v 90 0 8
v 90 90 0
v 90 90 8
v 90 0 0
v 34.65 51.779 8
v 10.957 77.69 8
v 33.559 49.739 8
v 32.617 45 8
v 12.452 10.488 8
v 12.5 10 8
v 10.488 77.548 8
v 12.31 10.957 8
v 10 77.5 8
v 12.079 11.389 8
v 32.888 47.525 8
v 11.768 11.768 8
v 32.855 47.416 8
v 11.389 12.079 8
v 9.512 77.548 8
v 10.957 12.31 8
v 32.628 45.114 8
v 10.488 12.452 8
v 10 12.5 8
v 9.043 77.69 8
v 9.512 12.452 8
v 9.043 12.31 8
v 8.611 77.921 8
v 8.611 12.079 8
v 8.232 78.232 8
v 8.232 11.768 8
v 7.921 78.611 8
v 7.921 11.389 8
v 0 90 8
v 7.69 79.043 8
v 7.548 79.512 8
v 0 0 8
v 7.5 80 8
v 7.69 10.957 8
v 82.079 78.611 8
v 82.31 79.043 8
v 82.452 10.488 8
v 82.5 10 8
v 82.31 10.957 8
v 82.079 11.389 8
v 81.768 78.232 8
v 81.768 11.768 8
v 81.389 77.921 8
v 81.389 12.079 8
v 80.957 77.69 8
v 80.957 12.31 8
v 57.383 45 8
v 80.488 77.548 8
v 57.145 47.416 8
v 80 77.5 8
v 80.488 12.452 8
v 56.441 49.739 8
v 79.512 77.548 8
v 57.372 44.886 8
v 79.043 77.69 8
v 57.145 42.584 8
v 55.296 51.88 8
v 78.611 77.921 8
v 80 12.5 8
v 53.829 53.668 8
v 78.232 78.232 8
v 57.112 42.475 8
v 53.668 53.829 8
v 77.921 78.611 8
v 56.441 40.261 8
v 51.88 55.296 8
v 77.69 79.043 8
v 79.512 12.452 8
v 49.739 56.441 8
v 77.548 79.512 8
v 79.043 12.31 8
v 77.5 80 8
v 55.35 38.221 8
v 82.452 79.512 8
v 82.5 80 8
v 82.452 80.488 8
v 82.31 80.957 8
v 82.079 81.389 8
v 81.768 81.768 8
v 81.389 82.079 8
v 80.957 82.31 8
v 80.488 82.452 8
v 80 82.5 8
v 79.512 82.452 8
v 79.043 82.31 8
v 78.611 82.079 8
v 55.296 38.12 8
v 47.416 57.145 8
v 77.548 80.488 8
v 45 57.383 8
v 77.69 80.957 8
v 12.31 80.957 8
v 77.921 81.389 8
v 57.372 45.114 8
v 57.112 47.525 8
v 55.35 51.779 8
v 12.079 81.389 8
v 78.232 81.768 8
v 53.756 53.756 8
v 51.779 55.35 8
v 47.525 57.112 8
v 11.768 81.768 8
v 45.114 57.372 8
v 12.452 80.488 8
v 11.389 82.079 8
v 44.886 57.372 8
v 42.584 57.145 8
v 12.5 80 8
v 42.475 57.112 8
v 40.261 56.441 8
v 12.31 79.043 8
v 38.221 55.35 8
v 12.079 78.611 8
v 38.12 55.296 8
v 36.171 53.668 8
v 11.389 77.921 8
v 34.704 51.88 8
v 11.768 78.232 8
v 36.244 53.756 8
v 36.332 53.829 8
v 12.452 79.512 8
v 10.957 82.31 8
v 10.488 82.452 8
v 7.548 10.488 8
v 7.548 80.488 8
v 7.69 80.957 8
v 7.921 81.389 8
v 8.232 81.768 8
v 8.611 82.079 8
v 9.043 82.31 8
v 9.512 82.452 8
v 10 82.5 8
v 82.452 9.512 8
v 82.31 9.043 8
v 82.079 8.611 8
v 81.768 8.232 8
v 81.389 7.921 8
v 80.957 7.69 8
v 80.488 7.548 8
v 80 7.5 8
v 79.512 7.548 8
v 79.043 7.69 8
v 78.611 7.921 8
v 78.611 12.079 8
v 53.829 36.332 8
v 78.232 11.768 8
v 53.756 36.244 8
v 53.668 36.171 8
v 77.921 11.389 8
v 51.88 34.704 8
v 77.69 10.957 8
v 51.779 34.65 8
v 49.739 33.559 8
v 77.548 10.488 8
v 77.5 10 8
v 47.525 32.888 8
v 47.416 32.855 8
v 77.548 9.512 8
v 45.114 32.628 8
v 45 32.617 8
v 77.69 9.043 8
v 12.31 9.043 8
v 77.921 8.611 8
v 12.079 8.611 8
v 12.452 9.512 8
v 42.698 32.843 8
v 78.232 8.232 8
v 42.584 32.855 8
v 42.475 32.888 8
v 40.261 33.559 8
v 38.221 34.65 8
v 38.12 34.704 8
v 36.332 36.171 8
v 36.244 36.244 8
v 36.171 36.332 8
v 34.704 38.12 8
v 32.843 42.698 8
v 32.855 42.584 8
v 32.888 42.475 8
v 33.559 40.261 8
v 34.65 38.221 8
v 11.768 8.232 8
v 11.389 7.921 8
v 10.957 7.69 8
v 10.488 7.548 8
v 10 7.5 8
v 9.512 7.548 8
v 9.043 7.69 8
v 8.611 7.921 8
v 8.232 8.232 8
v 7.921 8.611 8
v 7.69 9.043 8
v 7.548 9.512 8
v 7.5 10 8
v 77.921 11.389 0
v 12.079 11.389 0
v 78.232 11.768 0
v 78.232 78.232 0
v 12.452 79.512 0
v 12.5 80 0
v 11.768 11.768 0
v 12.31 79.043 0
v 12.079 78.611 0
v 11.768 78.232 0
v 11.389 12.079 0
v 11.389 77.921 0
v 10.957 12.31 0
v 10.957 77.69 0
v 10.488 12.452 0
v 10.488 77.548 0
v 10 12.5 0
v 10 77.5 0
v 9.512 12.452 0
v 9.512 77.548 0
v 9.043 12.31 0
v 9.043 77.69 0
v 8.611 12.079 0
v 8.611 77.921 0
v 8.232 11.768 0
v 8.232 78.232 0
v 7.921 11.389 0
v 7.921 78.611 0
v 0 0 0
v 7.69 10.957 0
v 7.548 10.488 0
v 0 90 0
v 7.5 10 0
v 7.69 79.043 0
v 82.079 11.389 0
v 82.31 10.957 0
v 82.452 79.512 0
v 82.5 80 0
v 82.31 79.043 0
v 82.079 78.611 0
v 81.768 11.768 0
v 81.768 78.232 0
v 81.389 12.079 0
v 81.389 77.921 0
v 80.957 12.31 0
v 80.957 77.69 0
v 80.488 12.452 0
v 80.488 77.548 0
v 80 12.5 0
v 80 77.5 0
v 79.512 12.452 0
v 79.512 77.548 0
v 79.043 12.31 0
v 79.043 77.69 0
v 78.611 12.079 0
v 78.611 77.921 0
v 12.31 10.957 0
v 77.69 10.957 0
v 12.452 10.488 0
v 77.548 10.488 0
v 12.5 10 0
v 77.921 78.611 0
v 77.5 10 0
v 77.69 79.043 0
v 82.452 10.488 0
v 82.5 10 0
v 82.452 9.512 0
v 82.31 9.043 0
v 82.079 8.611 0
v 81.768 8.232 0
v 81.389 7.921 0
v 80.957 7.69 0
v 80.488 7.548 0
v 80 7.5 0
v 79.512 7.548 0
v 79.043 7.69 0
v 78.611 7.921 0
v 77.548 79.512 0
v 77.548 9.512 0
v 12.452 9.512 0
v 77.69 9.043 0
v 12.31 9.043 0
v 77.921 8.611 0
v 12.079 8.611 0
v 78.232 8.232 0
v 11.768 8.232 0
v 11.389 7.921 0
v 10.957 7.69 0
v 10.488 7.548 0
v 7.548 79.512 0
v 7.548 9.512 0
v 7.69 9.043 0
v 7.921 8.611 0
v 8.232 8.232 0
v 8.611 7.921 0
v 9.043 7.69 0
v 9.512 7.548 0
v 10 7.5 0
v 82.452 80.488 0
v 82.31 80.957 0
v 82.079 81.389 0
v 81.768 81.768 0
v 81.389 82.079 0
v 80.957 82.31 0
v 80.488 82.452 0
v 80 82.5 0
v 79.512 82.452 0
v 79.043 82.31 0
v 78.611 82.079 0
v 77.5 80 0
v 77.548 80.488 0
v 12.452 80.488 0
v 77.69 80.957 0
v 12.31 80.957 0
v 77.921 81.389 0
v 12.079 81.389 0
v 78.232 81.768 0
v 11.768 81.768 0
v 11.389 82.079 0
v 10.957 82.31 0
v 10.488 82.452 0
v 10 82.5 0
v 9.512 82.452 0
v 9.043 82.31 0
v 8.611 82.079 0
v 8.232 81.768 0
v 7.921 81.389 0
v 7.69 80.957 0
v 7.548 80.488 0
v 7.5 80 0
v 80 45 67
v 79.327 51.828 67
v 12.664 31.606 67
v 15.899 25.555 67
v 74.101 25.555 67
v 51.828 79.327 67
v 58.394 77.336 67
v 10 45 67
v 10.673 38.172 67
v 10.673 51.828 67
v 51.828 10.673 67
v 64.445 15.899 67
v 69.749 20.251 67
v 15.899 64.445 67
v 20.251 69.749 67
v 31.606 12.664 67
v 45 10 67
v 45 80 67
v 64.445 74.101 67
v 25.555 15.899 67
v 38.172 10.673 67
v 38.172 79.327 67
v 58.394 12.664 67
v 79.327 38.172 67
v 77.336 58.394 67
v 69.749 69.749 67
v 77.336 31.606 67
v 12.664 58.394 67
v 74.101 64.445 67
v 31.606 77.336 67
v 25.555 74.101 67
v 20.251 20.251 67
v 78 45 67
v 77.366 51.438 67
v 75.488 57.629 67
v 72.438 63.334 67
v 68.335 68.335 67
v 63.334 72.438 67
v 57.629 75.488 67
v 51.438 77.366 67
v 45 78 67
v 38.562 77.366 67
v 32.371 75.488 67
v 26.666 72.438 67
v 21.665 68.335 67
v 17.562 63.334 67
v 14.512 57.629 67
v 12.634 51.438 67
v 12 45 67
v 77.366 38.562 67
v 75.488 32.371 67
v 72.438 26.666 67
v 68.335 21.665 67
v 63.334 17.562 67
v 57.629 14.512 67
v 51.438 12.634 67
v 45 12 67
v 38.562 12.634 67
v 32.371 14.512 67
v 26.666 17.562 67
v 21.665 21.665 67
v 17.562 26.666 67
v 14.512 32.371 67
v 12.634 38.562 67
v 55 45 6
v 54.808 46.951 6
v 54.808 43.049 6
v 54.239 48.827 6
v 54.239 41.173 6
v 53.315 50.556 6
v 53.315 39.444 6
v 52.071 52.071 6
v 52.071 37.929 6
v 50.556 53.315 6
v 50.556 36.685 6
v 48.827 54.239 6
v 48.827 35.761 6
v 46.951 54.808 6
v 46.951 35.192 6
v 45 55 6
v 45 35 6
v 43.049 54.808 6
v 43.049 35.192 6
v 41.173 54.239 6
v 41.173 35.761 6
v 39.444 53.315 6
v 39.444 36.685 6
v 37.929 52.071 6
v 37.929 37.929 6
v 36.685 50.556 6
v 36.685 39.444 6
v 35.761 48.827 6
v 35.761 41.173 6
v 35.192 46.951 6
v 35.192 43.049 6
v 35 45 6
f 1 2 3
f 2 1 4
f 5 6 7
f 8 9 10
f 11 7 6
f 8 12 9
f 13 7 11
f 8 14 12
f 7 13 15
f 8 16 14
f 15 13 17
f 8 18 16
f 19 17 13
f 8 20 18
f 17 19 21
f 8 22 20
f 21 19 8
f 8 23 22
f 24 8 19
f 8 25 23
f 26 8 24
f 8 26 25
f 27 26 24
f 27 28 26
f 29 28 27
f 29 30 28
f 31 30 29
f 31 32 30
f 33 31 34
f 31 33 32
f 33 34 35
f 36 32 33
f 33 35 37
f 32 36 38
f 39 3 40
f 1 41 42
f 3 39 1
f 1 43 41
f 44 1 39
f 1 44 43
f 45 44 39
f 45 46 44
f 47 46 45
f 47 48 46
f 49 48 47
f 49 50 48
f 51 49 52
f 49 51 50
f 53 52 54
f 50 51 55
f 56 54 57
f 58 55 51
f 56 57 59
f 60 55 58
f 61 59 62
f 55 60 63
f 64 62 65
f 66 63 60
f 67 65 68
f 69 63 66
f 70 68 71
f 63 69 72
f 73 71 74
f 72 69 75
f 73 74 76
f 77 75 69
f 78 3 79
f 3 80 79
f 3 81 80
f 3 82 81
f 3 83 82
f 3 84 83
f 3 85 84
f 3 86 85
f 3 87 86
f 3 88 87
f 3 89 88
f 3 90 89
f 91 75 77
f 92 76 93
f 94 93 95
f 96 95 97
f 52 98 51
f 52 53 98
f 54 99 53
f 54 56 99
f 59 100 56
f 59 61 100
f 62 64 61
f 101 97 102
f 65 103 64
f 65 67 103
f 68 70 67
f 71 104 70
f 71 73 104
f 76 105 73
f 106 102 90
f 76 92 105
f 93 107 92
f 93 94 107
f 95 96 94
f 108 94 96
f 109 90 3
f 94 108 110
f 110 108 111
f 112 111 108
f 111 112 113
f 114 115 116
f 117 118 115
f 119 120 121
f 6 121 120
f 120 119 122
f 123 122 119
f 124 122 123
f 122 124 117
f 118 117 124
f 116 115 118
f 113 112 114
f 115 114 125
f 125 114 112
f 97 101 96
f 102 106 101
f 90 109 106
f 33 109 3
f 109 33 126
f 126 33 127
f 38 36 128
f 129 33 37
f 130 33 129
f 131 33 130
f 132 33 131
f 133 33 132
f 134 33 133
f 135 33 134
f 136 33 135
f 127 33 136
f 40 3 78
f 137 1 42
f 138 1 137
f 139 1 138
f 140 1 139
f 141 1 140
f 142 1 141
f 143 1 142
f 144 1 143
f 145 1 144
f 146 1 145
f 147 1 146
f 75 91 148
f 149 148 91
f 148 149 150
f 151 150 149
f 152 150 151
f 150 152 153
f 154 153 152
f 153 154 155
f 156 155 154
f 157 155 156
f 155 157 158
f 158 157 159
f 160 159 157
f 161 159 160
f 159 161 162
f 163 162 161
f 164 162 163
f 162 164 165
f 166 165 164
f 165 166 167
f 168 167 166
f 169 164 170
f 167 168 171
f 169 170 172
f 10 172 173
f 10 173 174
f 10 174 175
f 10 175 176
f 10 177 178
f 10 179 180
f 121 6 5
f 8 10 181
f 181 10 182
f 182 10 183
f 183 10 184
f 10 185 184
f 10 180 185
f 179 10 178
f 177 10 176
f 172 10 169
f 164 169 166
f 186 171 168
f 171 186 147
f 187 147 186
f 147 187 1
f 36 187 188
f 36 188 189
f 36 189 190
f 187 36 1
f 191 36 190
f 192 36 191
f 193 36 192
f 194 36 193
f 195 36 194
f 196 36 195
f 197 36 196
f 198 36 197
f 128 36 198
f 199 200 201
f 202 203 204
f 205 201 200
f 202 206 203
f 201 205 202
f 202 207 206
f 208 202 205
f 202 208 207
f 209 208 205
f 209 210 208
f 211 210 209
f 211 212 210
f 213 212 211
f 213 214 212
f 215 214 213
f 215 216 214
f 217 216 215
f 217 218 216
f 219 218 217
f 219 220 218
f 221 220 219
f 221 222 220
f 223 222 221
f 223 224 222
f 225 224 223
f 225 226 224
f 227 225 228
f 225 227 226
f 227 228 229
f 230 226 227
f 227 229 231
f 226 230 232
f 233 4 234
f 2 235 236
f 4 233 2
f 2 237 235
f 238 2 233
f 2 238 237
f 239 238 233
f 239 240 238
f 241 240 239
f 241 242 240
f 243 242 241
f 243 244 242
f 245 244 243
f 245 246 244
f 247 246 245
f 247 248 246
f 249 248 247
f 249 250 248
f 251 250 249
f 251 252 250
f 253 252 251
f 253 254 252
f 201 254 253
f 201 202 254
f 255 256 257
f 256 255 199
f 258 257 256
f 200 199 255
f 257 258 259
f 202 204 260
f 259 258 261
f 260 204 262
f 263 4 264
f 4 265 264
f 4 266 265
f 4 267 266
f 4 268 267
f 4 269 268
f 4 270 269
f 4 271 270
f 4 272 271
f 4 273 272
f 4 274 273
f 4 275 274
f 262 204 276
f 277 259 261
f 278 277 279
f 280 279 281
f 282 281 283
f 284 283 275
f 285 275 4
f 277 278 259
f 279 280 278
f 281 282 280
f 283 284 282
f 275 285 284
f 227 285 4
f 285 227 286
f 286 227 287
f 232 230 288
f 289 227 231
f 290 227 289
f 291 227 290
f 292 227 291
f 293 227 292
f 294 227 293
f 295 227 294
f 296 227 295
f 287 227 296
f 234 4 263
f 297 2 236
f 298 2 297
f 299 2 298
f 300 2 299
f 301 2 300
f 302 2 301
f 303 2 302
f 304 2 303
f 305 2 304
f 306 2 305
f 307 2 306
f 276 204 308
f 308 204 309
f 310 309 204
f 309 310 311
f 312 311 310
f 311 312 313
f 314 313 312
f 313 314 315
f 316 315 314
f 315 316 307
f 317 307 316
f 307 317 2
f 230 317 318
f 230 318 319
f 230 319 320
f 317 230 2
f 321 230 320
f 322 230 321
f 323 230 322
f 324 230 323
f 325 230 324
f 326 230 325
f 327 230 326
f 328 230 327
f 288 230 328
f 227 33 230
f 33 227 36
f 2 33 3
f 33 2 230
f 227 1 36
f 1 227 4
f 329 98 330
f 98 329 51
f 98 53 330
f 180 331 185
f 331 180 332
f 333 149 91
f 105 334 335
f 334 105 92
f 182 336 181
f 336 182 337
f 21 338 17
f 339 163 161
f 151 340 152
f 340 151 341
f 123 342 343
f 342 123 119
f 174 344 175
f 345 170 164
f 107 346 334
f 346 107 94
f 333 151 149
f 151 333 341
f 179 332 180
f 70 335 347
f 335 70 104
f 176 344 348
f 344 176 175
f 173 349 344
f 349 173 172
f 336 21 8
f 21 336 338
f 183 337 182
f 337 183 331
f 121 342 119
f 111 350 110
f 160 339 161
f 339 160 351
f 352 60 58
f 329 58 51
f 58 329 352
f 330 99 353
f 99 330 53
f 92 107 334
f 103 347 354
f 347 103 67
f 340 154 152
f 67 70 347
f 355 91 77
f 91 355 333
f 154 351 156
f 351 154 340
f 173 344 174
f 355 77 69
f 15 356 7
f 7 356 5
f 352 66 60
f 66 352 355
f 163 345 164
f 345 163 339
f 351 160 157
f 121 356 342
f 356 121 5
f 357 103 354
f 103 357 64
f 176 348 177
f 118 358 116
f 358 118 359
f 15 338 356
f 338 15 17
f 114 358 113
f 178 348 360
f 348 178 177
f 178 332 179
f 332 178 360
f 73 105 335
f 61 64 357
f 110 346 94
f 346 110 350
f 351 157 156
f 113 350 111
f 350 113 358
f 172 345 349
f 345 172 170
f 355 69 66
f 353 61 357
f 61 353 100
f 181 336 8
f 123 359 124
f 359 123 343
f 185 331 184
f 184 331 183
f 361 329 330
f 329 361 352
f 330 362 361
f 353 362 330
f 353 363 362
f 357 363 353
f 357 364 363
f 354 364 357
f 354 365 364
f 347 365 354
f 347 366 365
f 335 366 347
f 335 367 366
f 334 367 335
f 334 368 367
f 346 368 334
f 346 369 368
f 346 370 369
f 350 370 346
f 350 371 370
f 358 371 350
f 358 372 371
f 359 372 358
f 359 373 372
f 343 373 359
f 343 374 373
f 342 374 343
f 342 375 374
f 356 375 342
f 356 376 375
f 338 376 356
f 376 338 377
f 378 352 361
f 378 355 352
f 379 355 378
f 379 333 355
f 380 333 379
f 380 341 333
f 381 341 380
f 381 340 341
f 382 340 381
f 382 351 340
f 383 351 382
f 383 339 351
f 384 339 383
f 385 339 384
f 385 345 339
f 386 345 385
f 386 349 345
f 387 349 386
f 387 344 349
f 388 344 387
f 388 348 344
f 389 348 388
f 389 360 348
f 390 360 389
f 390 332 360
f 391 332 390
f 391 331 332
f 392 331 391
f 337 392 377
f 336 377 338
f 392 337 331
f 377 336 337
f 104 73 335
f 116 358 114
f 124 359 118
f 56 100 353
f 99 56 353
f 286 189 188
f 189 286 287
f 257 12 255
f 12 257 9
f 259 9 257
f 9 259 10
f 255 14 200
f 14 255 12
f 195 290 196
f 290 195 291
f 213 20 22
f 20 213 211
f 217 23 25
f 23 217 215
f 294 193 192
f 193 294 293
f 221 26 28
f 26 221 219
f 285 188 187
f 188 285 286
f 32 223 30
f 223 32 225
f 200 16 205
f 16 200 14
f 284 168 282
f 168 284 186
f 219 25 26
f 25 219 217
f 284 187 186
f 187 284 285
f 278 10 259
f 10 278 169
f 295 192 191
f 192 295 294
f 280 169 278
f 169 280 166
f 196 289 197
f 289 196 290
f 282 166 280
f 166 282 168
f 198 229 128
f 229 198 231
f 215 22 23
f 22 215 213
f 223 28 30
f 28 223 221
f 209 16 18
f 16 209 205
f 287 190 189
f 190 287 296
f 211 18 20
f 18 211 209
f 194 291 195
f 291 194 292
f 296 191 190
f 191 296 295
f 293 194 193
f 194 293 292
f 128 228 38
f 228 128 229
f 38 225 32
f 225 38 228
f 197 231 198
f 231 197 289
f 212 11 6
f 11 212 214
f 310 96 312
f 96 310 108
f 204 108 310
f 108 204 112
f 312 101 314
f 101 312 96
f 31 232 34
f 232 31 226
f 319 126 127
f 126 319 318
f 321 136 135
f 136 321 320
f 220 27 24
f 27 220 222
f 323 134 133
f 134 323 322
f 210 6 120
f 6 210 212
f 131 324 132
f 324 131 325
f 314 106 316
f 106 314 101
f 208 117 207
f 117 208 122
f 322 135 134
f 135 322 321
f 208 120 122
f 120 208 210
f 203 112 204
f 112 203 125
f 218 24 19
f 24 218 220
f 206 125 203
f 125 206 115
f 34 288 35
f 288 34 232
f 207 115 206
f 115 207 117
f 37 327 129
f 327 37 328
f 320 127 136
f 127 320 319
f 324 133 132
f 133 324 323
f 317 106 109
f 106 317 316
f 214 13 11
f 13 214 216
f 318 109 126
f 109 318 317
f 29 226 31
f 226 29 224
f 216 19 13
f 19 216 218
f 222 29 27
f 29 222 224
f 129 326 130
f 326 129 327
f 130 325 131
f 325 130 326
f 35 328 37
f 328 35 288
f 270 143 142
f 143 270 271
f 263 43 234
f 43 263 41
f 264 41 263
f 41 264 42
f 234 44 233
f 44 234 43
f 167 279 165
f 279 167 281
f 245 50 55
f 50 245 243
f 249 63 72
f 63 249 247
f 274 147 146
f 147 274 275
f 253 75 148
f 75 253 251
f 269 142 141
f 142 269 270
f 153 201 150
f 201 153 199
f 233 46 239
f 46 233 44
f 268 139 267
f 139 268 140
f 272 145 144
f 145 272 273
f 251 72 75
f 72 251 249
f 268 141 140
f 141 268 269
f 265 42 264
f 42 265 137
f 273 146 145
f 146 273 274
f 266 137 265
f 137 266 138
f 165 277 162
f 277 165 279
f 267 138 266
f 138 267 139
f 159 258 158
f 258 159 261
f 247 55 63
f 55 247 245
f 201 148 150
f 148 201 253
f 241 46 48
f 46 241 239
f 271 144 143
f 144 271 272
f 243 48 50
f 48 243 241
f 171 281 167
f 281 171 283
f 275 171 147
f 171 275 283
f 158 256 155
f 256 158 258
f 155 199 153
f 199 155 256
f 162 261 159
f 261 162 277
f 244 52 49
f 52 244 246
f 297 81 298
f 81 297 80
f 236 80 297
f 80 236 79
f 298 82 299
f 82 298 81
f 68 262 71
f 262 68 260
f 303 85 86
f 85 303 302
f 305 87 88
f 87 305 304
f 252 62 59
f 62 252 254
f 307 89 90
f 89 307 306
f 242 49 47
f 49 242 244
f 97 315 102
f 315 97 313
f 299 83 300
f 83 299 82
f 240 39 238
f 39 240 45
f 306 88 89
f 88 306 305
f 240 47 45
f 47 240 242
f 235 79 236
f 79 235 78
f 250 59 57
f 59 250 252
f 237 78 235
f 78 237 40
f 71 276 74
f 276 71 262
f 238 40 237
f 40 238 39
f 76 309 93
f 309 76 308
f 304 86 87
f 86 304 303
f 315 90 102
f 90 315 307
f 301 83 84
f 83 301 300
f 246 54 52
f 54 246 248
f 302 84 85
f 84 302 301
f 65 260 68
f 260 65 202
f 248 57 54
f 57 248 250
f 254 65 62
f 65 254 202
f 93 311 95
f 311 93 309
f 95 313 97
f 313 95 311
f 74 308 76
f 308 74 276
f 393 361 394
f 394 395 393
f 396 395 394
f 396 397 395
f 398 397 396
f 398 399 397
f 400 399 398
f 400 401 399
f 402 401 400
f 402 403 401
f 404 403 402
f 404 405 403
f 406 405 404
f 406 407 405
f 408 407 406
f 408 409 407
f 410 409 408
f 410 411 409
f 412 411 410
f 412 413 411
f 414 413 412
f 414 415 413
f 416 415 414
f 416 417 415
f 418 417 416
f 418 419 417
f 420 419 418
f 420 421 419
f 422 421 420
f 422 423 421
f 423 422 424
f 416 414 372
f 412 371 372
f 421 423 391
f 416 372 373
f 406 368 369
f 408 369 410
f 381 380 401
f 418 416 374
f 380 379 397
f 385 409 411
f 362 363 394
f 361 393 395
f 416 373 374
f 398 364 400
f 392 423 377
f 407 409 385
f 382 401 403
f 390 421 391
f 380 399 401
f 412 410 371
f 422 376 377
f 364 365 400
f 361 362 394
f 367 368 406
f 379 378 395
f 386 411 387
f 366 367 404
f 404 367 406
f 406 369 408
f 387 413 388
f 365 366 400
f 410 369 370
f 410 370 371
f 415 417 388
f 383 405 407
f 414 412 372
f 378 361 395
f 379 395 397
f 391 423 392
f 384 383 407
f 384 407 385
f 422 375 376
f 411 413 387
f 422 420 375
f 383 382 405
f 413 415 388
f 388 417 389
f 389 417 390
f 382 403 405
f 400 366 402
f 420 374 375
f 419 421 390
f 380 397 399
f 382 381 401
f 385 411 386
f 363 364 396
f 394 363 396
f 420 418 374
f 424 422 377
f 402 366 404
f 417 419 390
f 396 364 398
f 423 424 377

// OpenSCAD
$fn = 32;

// ----------------------------------------------------------------------
// Hopper: flanged with square flange
// ----------------------------------------------------------------------

// --- parameters (mm) ---
fl = 90;                  // flange side, X and Y
fl_t = 8;                 // flange thickness
cone_h = 60;              // cone height above the flange
top_d = 70;               // cone mouth diameter
bot_d = 24;               // cone spout diameter
wall = 2;                 // cone wall thickness
hole_r = 2.5;             // flange hole radius
hole_in = 10;             // hole inset from the corners
fit_tol = 0.05;           // tolerance for press fits, mm
free_tol = 0.2;           // tolerance for clearance fits, mm

bore_d = bot_d - 2 * wall;  // spout bore diameter
total_h = fl_t + cone_h - 1;  // overall height

difference() {
  union() {
    cube([fl, fl, fl_t]);
    translate([fl / 2, fl / 2, fl_t - 1])
      cylinder(h = cone_h, d1 = bot_d, d2 = top_d);
  }
  translate([fl / 2, fl / 2, fl_t - 2])
    cylinder(h = cone_h + 1, d1 = bore_d, d2 = top_d - 2 * wall);
  for (sx = [0, 1], sy = [0, 1])
    translate([sx ? fl - hole_in : hole_in,
               sy ? fl - hole_in : hole_in, -1])
      cylinder(r = hole_r, h = fl_t + 2);
}
